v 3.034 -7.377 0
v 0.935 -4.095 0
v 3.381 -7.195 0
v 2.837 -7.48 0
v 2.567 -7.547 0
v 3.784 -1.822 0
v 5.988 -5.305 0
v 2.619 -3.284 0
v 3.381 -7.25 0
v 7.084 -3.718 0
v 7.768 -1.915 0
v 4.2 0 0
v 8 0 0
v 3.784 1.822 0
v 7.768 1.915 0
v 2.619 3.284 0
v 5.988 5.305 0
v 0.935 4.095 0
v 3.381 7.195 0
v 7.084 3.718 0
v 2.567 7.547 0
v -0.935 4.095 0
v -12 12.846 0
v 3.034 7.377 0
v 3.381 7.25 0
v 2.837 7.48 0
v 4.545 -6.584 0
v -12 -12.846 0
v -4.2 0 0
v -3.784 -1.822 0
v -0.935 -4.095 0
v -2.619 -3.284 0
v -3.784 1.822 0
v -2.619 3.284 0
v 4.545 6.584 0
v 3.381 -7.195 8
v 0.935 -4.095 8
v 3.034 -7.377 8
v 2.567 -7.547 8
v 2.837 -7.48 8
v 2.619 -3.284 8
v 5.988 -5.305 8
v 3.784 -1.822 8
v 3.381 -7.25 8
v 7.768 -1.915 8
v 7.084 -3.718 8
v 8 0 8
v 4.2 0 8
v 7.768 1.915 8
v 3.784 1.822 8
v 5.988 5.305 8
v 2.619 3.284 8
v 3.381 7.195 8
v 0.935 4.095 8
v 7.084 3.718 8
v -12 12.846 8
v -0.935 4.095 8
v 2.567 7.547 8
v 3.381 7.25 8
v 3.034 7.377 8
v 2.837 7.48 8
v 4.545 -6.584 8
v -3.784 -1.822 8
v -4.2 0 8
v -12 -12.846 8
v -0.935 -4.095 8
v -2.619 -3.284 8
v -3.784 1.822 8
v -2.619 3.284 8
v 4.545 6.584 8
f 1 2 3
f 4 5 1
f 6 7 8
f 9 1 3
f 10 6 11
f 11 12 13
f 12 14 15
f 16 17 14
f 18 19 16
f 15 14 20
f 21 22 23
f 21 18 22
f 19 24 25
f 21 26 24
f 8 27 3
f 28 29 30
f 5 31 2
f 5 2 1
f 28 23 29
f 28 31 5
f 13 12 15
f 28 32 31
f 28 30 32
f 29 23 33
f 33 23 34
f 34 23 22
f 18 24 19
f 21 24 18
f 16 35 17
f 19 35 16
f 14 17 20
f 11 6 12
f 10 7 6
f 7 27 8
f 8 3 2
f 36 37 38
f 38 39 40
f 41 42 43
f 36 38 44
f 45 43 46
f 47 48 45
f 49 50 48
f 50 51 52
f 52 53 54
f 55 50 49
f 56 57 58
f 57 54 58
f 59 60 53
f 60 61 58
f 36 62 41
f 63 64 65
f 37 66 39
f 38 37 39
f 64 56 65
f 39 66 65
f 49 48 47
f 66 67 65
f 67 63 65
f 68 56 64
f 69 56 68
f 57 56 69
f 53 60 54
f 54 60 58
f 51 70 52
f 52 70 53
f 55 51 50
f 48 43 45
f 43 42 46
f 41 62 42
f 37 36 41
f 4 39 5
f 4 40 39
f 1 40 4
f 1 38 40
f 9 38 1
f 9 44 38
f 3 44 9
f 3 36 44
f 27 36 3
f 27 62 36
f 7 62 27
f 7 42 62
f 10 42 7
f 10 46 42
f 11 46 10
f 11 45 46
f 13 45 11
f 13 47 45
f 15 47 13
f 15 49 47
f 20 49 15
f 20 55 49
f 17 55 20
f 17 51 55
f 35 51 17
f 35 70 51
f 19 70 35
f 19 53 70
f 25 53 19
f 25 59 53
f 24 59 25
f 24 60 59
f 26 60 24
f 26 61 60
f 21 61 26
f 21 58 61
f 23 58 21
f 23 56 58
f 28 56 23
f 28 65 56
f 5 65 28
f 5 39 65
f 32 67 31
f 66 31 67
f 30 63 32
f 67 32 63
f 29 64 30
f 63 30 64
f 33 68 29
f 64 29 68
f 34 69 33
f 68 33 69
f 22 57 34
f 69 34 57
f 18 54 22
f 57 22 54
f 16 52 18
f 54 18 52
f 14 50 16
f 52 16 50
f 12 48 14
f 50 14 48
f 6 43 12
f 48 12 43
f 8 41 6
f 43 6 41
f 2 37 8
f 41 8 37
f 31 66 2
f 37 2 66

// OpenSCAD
// misc mounting objects

module atu_mount_ear( h, r_i, r_o, alp = 60, k_ext = 1.0 )
{
  al = min( max( alp, 10 ), 120 ); // limit angle - not bullet proof
  r_e = k_ext * r_o;
  p0 = [ r_o * cos( al ), r_o * sin( al ) ];
  p1 = [ p0.x, -p0.y ];
  p2 = [ -r_e, p1.y - r_e * tan( 90 - al ) ];
  p3 = [ p2.x, -p2.y ];
  //for( p = [ p0, p1, p2, p3 ] ) {
  //  color("red") translate([r_o,0,h]) translate( p ) cylinder( r=0.1, h=1 );
  //}
 
  linear_extrude( height = h ) // translate([r_o,0,0])
    difference() {
      union() {
       circle( r = r_o );
       polygon( [ p0, p1, p2, p3 ] );
    } 
    circle( r = r_i );
  }
}  
 
atu_mount_ear( 8.0, 4.2, 8.0, 65, 1.5 );
